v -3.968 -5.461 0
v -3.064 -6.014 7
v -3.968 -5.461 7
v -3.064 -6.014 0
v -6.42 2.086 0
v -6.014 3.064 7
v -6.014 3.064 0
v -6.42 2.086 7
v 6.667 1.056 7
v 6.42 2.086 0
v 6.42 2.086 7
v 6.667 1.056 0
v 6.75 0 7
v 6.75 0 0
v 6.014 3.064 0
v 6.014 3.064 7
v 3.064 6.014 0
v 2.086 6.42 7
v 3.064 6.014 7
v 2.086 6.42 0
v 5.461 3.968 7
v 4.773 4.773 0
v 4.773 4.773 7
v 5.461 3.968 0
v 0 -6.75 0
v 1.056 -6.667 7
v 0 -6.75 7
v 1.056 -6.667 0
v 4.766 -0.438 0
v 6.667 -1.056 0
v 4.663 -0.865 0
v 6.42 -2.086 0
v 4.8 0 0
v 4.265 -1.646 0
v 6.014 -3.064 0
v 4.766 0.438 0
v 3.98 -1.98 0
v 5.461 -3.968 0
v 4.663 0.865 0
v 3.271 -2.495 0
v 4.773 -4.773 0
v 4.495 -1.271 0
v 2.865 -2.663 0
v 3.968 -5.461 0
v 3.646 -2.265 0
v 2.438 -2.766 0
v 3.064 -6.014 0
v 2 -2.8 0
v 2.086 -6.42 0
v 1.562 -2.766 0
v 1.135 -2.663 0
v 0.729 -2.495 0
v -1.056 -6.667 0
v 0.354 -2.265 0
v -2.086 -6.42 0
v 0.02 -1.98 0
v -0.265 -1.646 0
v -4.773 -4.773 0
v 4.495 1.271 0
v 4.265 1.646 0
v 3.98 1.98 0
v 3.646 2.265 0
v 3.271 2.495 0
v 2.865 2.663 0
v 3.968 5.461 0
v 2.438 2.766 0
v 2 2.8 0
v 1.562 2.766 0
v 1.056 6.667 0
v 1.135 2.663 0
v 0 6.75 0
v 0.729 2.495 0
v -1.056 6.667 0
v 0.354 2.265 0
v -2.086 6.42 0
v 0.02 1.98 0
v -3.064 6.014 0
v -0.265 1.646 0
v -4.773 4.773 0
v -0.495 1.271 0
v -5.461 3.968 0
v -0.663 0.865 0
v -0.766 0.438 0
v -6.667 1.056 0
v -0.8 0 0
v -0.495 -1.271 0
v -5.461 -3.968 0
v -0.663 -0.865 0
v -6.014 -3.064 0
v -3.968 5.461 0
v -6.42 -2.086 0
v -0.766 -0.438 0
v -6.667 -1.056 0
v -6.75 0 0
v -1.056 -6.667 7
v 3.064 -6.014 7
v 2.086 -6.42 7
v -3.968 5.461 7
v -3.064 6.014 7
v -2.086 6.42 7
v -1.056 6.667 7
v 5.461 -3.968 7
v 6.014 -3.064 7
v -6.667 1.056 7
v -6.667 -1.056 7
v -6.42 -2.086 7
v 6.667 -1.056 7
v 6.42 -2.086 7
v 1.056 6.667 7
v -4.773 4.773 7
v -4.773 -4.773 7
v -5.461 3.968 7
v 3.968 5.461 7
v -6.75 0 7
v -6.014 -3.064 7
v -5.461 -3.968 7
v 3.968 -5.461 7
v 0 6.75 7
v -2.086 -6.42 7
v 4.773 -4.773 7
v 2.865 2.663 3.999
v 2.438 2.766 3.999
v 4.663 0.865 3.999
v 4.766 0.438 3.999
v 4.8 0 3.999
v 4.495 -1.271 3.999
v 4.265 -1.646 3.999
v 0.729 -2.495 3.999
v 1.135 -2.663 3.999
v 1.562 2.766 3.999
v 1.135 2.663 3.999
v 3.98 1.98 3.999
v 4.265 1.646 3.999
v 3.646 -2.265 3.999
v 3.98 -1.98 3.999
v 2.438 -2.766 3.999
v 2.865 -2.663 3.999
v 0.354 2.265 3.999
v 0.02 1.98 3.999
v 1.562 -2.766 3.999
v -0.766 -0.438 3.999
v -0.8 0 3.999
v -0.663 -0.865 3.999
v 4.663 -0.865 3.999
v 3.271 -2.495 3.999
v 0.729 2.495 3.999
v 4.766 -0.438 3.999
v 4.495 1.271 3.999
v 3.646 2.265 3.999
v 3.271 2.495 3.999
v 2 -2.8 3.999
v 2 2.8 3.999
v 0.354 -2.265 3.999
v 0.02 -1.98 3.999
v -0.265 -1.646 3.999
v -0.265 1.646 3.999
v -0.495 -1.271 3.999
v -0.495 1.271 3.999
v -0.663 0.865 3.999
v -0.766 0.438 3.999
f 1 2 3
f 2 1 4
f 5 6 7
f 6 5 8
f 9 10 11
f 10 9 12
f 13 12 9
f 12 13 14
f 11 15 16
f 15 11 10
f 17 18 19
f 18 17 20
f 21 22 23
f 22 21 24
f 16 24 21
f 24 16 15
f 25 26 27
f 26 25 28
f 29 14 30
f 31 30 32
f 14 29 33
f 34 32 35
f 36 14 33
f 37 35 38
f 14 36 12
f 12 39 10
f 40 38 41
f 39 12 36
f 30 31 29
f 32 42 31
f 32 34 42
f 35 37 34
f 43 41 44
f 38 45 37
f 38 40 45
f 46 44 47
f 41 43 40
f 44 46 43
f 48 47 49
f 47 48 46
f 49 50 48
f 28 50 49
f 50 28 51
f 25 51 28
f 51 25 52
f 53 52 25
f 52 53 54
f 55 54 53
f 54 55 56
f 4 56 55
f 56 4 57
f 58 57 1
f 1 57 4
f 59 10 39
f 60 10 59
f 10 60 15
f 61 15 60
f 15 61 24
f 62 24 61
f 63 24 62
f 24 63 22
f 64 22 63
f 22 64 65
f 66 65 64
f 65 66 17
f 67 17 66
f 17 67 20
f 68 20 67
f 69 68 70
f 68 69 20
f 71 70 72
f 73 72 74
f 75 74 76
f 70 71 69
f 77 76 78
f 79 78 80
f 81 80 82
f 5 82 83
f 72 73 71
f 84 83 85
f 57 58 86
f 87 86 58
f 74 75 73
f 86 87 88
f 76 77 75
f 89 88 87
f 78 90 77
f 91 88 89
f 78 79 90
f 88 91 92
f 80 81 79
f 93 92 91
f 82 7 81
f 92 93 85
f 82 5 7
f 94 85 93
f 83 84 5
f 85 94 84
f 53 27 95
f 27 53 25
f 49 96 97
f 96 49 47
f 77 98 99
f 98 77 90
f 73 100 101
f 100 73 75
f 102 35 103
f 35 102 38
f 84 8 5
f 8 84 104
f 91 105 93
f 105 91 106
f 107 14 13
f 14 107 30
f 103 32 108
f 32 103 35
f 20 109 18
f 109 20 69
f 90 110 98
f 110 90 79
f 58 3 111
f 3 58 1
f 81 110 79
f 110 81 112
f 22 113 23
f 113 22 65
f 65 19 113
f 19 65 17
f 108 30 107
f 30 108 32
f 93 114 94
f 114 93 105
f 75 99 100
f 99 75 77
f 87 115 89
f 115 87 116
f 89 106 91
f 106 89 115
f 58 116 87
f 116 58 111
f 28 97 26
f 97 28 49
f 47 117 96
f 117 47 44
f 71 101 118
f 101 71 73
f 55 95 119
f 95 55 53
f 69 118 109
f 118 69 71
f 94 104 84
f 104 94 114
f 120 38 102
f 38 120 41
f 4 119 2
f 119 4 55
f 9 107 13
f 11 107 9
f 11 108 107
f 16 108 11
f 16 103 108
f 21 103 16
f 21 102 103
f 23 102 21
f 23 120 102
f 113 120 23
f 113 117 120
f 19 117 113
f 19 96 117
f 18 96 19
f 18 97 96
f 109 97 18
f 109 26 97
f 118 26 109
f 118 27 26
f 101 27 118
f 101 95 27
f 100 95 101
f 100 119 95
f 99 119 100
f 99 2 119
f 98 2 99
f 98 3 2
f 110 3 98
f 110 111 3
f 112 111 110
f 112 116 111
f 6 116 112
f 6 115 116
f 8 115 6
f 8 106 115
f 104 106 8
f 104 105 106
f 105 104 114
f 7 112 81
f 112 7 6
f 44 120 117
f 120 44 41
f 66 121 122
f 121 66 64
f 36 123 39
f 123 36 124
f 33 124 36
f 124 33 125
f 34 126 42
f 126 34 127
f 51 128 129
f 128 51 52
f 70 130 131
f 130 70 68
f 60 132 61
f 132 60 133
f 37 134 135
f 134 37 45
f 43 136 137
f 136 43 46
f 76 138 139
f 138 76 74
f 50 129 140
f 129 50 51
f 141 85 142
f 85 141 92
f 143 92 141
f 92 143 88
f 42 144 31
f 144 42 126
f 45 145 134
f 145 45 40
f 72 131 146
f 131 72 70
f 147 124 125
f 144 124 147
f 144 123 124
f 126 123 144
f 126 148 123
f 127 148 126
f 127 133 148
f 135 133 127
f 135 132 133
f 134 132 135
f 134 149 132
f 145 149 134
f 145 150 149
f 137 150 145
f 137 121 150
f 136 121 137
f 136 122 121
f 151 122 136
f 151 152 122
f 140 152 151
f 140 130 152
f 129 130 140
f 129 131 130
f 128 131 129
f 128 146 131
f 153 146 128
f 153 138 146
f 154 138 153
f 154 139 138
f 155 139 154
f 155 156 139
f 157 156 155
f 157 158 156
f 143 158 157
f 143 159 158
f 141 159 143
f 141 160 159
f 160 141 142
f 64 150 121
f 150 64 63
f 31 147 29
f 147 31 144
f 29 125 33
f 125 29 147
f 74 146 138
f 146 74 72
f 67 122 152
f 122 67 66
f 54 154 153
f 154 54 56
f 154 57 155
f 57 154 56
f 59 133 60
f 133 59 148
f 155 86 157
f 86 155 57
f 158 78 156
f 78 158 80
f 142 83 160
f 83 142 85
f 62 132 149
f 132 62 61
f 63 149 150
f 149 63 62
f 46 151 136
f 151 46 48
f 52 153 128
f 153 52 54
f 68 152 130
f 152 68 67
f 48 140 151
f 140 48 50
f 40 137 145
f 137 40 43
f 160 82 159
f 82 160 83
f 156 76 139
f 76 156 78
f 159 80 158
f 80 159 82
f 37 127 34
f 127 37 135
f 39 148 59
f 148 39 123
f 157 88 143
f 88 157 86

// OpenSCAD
$fn = 40;

difference() {
    cylinder(h=7.0, d=13.5);
    translate([2, 0, -0.001]) cylinder(h=4.0, d=5.6);
}
